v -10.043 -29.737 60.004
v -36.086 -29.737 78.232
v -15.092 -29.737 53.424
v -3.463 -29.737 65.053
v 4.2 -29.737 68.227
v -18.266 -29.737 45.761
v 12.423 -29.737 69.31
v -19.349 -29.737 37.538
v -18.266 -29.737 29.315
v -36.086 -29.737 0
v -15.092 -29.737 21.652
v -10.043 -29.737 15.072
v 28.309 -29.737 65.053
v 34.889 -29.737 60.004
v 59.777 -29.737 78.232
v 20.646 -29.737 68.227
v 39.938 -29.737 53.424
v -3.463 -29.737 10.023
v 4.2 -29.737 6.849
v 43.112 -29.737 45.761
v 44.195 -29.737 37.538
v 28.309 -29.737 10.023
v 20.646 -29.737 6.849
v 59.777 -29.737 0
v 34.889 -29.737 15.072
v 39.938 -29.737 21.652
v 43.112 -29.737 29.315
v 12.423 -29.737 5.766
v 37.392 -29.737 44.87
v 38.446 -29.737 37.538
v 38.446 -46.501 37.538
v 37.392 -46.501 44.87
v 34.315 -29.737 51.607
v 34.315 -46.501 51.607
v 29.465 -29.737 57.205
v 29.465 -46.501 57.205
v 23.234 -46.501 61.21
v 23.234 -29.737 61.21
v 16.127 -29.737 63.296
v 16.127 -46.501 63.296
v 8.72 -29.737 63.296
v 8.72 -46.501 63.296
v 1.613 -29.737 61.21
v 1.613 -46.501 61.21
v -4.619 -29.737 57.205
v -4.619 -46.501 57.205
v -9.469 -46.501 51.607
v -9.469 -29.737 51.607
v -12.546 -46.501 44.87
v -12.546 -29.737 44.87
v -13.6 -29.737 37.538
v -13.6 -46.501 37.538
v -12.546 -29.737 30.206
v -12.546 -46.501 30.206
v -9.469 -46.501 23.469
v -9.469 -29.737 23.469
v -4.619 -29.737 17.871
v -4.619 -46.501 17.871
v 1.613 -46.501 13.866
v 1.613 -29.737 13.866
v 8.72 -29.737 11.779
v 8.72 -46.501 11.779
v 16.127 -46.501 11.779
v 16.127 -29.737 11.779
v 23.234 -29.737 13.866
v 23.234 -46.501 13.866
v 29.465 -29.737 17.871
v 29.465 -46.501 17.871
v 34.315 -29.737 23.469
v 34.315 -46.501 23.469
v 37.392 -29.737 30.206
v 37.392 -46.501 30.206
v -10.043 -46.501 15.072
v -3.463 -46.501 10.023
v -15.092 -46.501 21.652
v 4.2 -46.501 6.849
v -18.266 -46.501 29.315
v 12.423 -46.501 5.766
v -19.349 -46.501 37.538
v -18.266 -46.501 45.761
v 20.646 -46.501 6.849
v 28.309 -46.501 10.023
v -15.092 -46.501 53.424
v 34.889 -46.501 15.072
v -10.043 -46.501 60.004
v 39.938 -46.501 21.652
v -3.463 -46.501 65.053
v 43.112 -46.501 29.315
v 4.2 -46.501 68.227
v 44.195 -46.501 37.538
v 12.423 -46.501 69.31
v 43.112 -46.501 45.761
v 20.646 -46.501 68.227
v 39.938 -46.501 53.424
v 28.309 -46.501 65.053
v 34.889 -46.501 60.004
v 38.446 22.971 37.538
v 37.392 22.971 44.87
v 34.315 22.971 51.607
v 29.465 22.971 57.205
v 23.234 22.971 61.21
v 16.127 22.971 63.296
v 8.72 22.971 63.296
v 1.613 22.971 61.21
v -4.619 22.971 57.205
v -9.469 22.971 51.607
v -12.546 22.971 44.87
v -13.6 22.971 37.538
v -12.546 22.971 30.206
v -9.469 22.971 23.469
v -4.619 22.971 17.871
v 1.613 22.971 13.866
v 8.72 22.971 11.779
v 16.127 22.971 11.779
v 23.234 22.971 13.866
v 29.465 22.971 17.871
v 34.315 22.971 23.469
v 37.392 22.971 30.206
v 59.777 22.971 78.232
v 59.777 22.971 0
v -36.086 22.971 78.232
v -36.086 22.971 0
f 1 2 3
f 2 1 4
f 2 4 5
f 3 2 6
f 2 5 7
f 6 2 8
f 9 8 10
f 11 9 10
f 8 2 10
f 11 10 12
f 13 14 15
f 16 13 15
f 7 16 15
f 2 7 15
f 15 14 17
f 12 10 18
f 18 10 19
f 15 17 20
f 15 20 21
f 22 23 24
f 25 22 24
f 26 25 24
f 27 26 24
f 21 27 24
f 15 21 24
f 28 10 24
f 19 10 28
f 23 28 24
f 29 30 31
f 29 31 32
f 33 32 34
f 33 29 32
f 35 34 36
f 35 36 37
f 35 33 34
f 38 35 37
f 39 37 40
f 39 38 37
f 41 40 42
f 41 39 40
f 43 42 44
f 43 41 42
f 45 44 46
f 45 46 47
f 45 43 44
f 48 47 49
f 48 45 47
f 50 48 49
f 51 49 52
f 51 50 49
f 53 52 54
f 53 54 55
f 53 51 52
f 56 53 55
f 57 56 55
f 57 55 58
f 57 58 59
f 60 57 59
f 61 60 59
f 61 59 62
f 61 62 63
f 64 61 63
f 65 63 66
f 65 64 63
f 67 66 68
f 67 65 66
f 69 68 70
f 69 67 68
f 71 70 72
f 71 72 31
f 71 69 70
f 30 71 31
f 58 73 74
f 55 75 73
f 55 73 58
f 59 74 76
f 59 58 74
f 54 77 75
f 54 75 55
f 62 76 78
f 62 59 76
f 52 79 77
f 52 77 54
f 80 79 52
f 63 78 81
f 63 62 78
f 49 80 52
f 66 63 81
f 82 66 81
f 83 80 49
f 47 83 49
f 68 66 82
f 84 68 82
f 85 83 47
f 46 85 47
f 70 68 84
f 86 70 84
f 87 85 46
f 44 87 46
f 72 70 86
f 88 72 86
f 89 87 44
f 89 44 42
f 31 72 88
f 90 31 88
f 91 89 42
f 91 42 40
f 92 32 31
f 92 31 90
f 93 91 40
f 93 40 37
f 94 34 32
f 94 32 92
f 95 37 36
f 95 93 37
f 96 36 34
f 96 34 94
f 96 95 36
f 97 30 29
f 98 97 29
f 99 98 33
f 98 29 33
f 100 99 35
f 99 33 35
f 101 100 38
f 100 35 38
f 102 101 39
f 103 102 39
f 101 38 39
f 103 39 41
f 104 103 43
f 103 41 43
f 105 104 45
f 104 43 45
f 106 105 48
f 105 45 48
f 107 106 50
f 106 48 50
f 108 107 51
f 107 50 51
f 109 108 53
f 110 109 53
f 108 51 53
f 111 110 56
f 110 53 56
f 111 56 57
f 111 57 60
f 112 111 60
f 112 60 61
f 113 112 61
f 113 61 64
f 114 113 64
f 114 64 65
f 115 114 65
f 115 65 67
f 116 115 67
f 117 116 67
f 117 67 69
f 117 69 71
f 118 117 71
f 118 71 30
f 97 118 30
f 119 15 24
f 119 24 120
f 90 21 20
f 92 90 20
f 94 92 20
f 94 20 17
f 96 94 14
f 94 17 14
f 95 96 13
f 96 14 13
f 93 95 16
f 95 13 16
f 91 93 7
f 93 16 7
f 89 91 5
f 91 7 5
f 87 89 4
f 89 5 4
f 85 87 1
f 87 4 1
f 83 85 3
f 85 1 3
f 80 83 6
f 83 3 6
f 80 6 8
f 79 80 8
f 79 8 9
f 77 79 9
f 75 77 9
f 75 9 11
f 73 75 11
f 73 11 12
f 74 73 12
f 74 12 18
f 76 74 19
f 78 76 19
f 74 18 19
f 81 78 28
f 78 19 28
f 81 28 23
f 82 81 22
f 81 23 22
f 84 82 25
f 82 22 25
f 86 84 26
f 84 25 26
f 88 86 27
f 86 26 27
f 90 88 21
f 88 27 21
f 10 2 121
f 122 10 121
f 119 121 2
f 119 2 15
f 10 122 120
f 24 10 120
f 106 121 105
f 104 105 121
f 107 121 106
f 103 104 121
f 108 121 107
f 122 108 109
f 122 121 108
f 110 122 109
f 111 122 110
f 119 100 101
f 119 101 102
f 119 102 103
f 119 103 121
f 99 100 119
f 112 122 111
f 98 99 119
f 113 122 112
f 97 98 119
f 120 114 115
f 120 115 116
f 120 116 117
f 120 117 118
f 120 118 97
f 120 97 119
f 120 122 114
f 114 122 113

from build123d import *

# Parameters (mm, degrees)
F0_W     = 95.863237977
F0_H     = 52.7086667717
F1_DEPTH = 78.232
F2_R     = 31.7719269524
F2_R_2   = 26.0233800566
F3_DEPTH = 16.764
F4_DEPTH = 137.668


with BuildPart() as f1:
    # F0 (on Top) → F1 (new body)
    with BuildSketch(Plane.XY):
        with Locations((11.8457712233, -3.3831223845)):
            Rectangle(F0_W, F0_H)
    extrude(amount=F1_DEPTH)

    # F2 (on face) → F3 (join)
    with BuildSketch(Plane.XZ.offset(29.7374557704)):
        with Locations((12.4230552465, 37.5379212201)):
            Circle(F2_R)
        with Locations((12.4230552465, 37.5379212201)):
            Circle(F2_R_2, mode=Mode.SUBTRACT)
    extrude(amount=F3_DEPTH)

    # F4 (cut): a face of the model
    f4_faces = [f1.faces().sort_by_distance(p)[0] for p in [
        (12.4230552465, -29.7374557704, 37.5379212201),
    ]]
    extrude(f4_faces, amount=-F4_DEPTH, mode=Mode.SUBTRACT)


solid = f1.part
